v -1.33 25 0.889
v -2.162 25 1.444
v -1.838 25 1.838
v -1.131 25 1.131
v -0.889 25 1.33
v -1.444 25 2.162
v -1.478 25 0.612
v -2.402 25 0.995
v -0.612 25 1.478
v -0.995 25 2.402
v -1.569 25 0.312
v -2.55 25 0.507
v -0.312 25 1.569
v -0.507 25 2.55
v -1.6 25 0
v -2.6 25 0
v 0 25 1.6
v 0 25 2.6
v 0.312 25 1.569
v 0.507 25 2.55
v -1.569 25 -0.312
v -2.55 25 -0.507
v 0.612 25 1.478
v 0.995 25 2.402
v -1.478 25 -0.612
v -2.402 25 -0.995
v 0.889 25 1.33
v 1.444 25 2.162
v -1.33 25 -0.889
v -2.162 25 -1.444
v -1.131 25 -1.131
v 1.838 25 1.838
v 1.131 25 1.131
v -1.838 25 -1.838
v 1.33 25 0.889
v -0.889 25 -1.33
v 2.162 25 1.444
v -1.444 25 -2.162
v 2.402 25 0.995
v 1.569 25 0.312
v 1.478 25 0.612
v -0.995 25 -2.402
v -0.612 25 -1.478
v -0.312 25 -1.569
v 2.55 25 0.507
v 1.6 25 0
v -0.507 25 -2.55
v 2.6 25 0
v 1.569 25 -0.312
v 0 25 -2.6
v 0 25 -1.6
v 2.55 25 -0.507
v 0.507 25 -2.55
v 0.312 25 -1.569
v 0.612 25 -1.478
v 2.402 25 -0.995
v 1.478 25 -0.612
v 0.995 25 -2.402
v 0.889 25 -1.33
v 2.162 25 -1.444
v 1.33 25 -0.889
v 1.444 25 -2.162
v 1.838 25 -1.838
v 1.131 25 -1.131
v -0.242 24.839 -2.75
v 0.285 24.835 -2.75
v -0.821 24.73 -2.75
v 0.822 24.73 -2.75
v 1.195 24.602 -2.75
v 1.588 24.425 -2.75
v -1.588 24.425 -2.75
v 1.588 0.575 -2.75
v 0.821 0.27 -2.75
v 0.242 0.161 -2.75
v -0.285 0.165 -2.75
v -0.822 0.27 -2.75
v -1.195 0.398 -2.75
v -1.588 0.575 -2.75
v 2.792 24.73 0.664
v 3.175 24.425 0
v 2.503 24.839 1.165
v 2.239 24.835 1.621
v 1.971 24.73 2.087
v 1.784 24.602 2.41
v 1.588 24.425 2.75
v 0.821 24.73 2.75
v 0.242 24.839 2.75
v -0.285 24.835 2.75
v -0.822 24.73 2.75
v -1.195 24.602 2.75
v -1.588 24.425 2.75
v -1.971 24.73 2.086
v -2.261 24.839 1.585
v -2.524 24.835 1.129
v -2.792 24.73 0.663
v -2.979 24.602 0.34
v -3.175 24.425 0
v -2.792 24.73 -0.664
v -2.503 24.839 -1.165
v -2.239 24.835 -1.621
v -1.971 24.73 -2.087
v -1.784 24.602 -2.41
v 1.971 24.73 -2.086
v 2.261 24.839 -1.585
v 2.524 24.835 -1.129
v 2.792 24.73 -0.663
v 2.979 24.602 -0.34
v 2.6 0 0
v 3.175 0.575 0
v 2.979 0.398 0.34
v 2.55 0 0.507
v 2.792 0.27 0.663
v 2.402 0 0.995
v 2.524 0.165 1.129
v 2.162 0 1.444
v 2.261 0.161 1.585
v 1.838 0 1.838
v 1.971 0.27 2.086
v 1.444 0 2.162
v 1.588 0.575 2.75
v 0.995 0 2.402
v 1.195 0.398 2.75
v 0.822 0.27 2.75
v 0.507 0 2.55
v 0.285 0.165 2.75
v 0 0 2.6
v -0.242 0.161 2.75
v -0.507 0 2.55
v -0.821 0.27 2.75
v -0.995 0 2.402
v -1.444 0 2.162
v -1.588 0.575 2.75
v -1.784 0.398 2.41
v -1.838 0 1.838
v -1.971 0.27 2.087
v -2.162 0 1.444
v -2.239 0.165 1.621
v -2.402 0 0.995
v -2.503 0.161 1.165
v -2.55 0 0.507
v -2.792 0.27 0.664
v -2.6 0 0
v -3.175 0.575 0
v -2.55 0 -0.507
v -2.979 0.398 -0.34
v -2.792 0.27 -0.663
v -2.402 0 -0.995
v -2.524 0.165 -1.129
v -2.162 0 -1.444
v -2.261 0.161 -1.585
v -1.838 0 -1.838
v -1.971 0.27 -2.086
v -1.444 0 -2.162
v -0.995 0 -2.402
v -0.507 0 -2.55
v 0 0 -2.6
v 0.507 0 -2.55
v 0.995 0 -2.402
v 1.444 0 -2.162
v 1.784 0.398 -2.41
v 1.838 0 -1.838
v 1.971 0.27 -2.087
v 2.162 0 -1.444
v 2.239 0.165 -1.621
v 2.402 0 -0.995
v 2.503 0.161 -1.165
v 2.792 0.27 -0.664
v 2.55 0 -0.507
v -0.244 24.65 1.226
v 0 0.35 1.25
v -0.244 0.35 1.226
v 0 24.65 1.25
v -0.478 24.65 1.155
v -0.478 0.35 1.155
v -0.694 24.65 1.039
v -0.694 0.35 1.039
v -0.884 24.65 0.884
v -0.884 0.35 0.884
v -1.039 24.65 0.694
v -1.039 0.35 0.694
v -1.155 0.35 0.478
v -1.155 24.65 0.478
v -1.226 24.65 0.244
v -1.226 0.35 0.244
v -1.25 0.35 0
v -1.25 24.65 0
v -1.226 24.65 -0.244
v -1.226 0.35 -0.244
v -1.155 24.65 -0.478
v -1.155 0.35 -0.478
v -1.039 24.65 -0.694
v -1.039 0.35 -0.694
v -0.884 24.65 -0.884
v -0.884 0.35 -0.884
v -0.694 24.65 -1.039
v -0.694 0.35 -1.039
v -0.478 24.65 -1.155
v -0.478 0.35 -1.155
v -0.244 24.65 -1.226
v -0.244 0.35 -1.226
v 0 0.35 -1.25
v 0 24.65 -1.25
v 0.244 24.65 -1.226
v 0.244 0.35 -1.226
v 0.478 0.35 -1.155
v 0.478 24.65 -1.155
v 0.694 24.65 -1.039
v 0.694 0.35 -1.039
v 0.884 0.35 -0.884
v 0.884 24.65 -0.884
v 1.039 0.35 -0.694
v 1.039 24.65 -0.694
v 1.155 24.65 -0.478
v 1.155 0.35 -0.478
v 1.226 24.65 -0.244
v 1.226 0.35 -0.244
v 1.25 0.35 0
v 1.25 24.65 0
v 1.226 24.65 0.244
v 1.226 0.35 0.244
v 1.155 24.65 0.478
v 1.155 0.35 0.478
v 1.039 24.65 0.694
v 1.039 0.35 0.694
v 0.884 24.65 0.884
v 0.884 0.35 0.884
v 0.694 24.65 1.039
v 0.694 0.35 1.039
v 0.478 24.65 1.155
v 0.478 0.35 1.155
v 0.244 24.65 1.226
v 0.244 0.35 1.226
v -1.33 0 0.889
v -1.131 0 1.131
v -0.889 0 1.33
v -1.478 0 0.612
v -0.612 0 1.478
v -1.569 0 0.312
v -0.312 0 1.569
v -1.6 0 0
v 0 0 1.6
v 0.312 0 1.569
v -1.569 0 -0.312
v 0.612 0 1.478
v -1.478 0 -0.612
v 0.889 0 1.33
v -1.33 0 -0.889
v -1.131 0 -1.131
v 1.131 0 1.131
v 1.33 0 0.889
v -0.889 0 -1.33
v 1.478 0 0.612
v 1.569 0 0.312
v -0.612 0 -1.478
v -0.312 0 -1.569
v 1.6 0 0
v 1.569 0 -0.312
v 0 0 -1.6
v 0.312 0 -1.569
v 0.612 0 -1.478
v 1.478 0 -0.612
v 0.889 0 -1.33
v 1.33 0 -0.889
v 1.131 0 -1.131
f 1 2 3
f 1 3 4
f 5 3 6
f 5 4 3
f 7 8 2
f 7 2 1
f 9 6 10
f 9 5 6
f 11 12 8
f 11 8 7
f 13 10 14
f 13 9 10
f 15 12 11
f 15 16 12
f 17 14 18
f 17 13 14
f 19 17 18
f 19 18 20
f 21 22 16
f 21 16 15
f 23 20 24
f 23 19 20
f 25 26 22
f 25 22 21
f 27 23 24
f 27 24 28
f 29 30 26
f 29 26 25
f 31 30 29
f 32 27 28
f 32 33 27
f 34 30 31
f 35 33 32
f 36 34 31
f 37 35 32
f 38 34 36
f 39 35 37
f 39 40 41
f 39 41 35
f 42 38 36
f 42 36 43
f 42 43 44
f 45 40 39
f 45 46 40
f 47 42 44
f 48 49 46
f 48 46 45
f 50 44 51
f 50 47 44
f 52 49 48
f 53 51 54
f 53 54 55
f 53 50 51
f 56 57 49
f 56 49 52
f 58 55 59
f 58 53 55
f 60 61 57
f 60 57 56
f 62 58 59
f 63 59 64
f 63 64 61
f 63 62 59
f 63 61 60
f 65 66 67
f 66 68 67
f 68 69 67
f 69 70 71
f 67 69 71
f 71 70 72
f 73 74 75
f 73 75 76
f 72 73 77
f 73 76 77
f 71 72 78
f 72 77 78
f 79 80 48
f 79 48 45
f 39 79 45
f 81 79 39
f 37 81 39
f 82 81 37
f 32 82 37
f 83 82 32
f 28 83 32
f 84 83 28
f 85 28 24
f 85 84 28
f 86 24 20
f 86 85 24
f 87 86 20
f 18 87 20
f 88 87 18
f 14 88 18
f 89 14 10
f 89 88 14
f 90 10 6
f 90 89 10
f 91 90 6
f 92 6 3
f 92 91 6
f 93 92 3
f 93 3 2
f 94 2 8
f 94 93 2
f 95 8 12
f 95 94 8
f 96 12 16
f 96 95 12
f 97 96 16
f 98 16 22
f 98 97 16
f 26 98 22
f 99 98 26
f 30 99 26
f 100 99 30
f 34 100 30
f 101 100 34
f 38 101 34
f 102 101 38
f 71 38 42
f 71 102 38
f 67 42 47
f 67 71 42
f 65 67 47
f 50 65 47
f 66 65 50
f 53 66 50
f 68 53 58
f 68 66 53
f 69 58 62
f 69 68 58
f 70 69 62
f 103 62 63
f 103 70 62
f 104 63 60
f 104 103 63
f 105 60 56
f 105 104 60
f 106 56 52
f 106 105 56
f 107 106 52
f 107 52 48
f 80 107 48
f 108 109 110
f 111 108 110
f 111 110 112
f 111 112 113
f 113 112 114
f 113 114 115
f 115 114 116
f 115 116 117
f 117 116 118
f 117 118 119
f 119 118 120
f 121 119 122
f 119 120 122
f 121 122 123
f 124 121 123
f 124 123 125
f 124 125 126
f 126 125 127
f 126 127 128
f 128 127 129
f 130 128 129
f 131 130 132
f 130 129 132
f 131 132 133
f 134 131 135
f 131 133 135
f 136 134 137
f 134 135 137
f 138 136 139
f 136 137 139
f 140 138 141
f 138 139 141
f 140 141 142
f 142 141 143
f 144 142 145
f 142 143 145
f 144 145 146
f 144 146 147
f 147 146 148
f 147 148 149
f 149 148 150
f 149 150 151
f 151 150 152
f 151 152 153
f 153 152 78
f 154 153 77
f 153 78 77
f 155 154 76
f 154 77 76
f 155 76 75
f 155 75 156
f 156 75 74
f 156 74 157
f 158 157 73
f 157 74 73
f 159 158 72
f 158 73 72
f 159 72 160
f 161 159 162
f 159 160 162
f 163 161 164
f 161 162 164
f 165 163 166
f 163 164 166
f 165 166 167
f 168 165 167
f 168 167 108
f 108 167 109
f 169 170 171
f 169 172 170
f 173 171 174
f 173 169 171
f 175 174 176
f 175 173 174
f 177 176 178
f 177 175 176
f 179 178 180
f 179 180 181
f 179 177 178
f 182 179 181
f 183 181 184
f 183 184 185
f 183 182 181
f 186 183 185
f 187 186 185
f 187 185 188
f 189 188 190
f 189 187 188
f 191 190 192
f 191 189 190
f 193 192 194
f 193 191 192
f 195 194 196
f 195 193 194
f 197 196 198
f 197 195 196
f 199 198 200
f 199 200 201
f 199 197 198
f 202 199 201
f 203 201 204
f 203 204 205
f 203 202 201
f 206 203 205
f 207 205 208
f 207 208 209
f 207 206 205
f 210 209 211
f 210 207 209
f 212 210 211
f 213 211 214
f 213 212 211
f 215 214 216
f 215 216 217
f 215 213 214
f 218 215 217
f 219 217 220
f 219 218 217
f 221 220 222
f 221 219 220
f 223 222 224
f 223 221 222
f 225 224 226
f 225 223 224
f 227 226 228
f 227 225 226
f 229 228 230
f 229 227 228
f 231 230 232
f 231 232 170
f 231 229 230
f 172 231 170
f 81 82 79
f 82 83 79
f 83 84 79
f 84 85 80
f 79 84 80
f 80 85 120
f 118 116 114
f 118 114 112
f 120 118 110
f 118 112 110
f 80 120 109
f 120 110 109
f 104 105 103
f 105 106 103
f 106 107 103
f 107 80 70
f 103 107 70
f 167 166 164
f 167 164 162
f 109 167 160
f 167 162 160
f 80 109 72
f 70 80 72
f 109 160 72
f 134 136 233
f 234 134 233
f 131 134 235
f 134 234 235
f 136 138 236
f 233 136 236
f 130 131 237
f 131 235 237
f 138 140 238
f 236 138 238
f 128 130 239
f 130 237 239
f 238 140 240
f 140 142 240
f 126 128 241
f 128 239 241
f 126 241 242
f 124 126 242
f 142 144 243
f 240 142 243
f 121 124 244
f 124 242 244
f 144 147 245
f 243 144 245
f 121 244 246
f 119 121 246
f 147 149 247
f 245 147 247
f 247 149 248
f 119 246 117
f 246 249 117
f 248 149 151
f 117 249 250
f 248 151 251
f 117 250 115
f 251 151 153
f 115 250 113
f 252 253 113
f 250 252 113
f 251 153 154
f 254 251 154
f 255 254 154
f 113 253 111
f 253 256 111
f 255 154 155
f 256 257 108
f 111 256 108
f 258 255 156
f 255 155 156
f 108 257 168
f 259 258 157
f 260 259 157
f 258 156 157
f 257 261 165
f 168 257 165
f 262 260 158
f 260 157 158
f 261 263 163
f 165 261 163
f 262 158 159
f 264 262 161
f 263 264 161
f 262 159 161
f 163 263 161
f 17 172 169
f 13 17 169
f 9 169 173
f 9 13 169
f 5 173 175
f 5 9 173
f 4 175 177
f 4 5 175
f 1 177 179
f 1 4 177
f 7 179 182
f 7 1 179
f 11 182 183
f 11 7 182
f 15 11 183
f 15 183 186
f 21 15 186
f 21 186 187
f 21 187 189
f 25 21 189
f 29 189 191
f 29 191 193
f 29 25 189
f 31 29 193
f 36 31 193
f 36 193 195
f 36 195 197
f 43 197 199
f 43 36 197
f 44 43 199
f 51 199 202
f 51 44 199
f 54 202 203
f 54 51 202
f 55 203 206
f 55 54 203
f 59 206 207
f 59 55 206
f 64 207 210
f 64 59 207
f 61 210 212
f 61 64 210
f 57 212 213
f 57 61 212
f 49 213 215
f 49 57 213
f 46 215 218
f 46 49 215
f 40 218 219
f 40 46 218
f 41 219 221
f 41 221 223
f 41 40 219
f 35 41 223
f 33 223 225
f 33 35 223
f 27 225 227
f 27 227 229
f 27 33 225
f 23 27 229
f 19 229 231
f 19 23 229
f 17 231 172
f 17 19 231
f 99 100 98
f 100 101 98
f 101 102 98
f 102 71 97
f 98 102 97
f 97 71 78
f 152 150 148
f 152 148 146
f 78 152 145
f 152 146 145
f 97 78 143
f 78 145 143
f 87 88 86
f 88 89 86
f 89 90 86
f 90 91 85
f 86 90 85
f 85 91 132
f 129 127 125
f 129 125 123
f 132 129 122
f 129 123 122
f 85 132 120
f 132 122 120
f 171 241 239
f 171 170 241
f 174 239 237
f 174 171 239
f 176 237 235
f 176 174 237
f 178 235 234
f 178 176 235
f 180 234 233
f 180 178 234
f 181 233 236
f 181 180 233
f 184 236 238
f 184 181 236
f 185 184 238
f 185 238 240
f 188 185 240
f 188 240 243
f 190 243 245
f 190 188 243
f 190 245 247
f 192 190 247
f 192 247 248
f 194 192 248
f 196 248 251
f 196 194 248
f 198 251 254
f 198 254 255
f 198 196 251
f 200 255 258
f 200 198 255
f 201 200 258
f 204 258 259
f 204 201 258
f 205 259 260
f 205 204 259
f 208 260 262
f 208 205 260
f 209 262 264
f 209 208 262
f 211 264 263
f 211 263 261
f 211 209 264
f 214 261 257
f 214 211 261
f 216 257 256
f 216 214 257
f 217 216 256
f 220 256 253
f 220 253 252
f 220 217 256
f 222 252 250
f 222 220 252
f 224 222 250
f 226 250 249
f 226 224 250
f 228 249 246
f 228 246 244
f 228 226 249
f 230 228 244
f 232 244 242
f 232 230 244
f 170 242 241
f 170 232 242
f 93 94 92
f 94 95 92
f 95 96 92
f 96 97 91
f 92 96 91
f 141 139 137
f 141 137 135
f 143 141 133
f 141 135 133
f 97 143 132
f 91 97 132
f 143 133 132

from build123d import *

# Parameters (mm, degrees)
BOSS_EXTRUDE1_DEPTH = 25


with BuildPart() as part:
    # Sketch1 → Boss-Extrude1 (new body)
    with BuildSketch(Plane(origin=(0, 0, 0), x_dir=(1, 0, 0), z_dir=(0, 1, 0))):
        Polygon((1.58771324, 2.75), (-1.58771324, 2.75), (-3.175426481, 0), (-1.58771324, -2.75), (1.58771324, -2.75), (3.175426481, 0), align=None)
    extrude(amount=BOSS_EXTRUDE1_DEPTH)

    # Sketch2 → M3 Tapped Hole1 (revolve, cut)
    with BuildSketch(Plane(origin=(0, 25, 0), x_dir=(0, 0, 1), z_dir=(1, 0, 0))):
        Polygon((0, 0), (0, 25), (1.6, 25), (1.25, 24.65), (1.25, 0.35), (1.6, 0), align=None)
    revolve(axis=Axis((0, 31.35, 0), (0, -1, 0)), mode=Mode.SUBTRACT)

    # Sketch4 → Cut-Revolve1 (revolve, cut)
    with BuildSketch(Plane.XY):
        Polygon((2.6, 0), (3.175426481, 0.575426481), (3.175426481, 0), align=None)
        Polygon((3.175426481, 25), (2.6, 25), (3.175426481, 24.424573519), align=None)
    revolve(axis=Axis((0, 25, 0), (0, -1, 0)), mode=Mode.SUBTRACT)


solid = part.part
